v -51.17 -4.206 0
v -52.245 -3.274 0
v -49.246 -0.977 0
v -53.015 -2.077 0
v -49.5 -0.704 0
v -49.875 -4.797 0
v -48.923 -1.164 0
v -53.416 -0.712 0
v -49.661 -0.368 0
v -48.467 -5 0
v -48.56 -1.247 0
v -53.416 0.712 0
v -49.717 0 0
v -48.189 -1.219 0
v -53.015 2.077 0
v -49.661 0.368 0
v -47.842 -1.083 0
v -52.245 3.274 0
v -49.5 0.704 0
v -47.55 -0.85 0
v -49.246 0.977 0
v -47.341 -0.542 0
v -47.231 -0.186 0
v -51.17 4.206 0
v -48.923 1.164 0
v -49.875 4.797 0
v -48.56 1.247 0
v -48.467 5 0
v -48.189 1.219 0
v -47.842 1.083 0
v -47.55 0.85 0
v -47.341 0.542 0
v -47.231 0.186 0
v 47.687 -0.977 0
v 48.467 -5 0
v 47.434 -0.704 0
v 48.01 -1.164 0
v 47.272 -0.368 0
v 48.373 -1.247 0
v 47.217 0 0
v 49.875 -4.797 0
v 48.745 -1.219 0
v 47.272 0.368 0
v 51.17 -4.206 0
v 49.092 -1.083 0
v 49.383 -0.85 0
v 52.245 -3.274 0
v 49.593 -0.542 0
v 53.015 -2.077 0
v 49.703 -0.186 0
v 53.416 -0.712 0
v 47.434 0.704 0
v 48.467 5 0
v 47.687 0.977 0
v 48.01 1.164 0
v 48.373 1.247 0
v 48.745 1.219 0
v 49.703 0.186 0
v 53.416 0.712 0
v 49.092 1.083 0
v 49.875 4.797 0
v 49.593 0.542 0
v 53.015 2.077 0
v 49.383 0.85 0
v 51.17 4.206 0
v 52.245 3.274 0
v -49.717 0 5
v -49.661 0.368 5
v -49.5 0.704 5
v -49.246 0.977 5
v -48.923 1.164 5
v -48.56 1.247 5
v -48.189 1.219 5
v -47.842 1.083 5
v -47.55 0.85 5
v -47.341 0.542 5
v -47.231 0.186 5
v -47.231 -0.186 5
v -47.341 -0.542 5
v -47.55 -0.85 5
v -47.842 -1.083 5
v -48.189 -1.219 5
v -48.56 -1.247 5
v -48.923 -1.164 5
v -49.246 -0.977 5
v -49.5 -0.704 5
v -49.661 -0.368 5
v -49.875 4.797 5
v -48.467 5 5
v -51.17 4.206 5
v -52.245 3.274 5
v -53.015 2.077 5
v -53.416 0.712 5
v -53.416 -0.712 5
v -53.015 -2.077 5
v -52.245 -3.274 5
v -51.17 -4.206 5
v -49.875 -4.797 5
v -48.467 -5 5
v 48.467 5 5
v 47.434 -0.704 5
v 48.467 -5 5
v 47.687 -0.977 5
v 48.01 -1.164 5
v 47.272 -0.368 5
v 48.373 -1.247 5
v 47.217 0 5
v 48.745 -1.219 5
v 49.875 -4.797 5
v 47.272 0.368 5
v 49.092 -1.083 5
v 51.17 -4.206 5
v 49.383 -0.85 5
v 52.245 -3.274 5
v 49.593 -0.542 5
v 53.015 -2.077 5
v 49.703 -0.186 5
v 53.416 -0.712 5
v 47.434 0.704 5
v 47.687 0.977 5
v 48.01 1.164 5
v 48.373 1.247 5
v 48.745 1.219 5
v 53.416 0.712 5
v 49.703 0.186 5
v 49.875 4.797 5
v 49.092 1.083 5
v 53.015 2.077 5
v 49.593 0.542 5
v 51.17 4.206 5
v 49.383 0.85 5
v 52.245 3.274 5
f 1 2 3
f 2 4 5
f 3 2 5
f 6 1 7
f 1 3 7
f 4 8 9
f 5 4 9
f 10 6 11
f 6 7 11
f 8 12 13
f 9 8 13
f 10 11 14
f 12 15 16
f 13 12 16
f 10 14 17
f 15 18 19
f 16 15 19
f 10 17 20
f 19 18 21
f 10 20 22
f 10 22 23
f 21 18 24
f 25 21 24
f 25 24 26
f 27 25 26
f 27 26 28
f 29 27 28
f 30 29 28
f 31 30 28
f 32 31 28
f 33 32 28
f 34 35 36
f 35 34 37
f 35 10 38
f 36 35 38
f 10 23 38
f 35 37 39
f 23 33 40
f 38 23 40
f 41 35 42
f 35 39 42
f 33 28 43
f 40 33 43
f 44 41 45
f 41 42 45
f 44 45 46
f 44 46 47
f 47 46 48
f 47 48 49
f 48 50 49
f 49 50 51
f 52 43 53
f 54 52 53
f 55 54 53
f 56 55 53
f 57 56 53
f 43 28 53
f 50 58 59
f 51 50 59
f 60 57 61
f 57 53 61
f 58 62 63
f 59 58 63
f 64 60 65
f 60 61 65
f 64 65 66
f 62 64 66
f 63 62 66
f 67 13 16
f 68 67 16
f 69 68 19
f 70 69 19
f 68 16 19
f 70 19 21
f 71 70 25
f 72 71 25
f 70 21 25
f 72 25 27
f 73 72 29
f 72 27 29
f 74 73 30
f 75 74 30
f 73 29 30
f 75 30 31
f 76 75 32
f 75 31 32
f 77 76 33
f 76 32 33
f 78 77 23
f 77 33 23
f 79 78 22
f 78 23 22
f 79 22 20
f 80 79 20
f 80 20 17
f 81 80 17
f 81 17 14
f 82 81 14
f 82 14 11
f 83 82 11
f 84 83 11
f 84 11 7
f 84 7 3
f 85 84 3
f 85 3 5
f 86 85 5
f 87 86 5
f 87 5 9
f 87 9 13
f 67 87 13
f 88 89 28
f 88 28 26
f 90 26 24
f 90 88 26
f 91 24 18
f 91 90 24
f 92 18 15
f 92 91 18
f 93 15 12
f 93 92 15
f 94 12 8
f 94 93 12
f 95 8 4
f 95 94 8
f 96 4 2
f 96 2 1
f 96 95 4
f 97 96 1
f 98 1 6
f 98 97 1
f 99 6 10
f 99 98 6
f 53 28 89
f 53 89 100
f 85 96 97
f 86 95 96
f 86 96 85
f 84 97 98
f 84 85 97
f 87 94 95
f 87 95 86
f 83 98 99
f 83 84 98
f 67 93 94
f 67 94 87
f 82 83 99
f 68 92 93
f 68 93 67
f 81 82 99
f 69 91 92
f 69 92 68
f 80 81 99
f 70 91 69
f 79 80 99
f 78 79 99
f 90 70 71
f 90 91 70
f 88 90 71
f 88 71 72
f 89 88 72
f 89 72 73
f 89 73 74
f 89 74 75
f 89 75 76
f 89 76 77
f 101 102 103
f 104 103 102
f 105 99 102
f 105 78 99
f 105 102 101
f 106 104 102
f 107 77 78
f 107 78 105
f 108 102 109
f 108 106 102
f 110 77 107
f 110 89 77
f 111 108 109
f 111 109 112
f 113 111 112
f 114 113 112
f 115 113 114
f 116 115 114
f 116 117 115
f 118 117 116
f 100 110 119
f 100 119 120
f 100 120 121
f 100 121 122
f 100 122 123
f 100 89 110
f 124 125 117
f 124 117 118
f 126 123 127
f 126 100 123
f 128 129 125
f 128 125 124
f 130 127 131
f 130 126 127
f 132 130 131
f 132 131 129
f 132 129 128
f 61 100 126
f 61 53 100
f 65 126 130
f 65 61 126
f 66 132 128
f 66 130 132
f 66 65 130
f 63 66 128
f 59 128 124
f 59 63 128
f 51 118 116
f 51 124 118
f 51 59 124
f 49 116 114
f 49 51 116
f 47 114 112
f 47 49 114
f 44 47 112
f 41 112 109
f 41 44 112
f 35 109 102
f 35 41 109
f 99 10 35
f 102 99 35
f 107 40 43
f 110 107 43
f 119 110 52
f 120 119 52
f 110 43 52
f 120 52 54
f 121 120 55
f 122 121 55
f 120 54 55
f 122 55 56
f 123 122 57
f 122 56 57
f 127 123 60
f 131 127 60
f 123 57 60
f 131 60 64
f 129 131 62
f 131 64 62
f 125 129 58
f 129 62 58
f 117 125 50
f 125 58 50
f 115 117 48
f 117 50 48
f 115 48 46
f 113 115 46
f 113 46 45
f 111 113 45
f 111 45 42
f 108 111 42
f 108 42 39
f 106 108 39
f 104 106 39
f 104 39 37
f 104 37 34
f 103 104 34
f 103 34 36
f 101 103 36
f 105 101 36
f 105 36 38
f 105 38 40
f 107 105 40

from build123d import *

# Parameters (mm, degrees)
SKETCH1_W                 = 106.9335
SKETCH1_H                 = 10
BOSS_EXTRUDE1_DEPTH       = 5
FILLET1_RADIUS            = 5
FILLET1_LENGTH            = 5
FILLET2_RADIUS            = 5
FILLET2_LENGTH            = 5
M3X0_5_TAPPED_HOLE1_D     = 2.5
M3X0_5_TAPPED_HOLE1_DEPTH = 29.81
M3X0_5_TAPPED_HOLE1_TIP   = 0.751075774


with BuildPart() as part:
    # Sketch1 → Boss-Extrude1 (new body)
    with BuildSketch(Plane.XY):
        Rectangle(SKETCH1_W, SKETCH1_H)
    extrude(amount=BOSS_EXTRUDE1_DEPTH)

    # Fillet1: full round fillet: the end face becomes a half cylinder, R = half its width
    fillet1_face = Plane((-53.46675, 0, 2.5), x_dir=(0, 0, 1), z_dir=(-1, 0, 0))  # on the end face: x along it, z out of the body
    fillet1_slab = fillet1_face.offset(-FILLET1_RADIUS / 2) * Box(FILLET1_LENGTH, 2 * FILLET1_RADIUS, FILLET1_RADIUS, mode=Mode.PRIVATE)  # the body's end, R deep
    fillet1_round = Plane((-48.46675, 0, 2.5), x_dir=(-1, 0, 0), z_dir=(0, 0, 1)) * Cylinder(FILLET1_RADIUS, FILLET1_LENGTH, mode=Mode.PRIVATE)  # its axis R under the face
    add(fillet1_slab - fillet1_round, mode=Mode.SUBTRACT)

    # Fillet2: full round fillet: the end face becomes a half cylinder, R = half its width
    fillet2_face = Plane((53.46675, 0, 2.5), x_dir=(0, 0, -1), z_dir=(1, 0, 0))  # on the end face: x along it, z out of the body
    fillet2_slab = fillet2_face.offset(-FILLET2_RADIUS / 2) * Box(FILLET2_LENGTH, 2 * FILLET2_RADIUS, FILLET2_RADIUS, mode=Mode.PRIVATE)  # the body's end, R deep
    fillet2_round = Plane((48.46675, 0, 2.5), x_dir=(1, 0, 0), z_dir=(0, 0, -1)) * Cylinder(FILLET2_RADIUS, FILLET2_LENGTH, mode=Mode.PRIVATE)  # its axis R under the face
    add(fillet2_slab - fillet2_round, mode=Mode.SUBTRACT)

    # M3x0.5 Tapped Hole1
    with Locations(Plane.XY.offset(5)):
        with Locations((-48.46675, 0), (48.46675, 0)):
            Hole(M3X0_5_TAPPED_HOLE1_D / 2, depth=M3X0_5_TAPPED_HOLE1_DEPTH)
            with Locations((0, 0, -(M3X0_5_TAPPED_HOLE1_DEPTH + M3X0_5_TAPPED_HOLE1_TIP / 2))):  # 118° drill point
                Cone(0, M3X0_5_TAPPED_HOLE1_D / 2, M3X0_5_TAPPED_HOLE1_TIP, mode=Mode.SUBTRACT)


solid = part.part
